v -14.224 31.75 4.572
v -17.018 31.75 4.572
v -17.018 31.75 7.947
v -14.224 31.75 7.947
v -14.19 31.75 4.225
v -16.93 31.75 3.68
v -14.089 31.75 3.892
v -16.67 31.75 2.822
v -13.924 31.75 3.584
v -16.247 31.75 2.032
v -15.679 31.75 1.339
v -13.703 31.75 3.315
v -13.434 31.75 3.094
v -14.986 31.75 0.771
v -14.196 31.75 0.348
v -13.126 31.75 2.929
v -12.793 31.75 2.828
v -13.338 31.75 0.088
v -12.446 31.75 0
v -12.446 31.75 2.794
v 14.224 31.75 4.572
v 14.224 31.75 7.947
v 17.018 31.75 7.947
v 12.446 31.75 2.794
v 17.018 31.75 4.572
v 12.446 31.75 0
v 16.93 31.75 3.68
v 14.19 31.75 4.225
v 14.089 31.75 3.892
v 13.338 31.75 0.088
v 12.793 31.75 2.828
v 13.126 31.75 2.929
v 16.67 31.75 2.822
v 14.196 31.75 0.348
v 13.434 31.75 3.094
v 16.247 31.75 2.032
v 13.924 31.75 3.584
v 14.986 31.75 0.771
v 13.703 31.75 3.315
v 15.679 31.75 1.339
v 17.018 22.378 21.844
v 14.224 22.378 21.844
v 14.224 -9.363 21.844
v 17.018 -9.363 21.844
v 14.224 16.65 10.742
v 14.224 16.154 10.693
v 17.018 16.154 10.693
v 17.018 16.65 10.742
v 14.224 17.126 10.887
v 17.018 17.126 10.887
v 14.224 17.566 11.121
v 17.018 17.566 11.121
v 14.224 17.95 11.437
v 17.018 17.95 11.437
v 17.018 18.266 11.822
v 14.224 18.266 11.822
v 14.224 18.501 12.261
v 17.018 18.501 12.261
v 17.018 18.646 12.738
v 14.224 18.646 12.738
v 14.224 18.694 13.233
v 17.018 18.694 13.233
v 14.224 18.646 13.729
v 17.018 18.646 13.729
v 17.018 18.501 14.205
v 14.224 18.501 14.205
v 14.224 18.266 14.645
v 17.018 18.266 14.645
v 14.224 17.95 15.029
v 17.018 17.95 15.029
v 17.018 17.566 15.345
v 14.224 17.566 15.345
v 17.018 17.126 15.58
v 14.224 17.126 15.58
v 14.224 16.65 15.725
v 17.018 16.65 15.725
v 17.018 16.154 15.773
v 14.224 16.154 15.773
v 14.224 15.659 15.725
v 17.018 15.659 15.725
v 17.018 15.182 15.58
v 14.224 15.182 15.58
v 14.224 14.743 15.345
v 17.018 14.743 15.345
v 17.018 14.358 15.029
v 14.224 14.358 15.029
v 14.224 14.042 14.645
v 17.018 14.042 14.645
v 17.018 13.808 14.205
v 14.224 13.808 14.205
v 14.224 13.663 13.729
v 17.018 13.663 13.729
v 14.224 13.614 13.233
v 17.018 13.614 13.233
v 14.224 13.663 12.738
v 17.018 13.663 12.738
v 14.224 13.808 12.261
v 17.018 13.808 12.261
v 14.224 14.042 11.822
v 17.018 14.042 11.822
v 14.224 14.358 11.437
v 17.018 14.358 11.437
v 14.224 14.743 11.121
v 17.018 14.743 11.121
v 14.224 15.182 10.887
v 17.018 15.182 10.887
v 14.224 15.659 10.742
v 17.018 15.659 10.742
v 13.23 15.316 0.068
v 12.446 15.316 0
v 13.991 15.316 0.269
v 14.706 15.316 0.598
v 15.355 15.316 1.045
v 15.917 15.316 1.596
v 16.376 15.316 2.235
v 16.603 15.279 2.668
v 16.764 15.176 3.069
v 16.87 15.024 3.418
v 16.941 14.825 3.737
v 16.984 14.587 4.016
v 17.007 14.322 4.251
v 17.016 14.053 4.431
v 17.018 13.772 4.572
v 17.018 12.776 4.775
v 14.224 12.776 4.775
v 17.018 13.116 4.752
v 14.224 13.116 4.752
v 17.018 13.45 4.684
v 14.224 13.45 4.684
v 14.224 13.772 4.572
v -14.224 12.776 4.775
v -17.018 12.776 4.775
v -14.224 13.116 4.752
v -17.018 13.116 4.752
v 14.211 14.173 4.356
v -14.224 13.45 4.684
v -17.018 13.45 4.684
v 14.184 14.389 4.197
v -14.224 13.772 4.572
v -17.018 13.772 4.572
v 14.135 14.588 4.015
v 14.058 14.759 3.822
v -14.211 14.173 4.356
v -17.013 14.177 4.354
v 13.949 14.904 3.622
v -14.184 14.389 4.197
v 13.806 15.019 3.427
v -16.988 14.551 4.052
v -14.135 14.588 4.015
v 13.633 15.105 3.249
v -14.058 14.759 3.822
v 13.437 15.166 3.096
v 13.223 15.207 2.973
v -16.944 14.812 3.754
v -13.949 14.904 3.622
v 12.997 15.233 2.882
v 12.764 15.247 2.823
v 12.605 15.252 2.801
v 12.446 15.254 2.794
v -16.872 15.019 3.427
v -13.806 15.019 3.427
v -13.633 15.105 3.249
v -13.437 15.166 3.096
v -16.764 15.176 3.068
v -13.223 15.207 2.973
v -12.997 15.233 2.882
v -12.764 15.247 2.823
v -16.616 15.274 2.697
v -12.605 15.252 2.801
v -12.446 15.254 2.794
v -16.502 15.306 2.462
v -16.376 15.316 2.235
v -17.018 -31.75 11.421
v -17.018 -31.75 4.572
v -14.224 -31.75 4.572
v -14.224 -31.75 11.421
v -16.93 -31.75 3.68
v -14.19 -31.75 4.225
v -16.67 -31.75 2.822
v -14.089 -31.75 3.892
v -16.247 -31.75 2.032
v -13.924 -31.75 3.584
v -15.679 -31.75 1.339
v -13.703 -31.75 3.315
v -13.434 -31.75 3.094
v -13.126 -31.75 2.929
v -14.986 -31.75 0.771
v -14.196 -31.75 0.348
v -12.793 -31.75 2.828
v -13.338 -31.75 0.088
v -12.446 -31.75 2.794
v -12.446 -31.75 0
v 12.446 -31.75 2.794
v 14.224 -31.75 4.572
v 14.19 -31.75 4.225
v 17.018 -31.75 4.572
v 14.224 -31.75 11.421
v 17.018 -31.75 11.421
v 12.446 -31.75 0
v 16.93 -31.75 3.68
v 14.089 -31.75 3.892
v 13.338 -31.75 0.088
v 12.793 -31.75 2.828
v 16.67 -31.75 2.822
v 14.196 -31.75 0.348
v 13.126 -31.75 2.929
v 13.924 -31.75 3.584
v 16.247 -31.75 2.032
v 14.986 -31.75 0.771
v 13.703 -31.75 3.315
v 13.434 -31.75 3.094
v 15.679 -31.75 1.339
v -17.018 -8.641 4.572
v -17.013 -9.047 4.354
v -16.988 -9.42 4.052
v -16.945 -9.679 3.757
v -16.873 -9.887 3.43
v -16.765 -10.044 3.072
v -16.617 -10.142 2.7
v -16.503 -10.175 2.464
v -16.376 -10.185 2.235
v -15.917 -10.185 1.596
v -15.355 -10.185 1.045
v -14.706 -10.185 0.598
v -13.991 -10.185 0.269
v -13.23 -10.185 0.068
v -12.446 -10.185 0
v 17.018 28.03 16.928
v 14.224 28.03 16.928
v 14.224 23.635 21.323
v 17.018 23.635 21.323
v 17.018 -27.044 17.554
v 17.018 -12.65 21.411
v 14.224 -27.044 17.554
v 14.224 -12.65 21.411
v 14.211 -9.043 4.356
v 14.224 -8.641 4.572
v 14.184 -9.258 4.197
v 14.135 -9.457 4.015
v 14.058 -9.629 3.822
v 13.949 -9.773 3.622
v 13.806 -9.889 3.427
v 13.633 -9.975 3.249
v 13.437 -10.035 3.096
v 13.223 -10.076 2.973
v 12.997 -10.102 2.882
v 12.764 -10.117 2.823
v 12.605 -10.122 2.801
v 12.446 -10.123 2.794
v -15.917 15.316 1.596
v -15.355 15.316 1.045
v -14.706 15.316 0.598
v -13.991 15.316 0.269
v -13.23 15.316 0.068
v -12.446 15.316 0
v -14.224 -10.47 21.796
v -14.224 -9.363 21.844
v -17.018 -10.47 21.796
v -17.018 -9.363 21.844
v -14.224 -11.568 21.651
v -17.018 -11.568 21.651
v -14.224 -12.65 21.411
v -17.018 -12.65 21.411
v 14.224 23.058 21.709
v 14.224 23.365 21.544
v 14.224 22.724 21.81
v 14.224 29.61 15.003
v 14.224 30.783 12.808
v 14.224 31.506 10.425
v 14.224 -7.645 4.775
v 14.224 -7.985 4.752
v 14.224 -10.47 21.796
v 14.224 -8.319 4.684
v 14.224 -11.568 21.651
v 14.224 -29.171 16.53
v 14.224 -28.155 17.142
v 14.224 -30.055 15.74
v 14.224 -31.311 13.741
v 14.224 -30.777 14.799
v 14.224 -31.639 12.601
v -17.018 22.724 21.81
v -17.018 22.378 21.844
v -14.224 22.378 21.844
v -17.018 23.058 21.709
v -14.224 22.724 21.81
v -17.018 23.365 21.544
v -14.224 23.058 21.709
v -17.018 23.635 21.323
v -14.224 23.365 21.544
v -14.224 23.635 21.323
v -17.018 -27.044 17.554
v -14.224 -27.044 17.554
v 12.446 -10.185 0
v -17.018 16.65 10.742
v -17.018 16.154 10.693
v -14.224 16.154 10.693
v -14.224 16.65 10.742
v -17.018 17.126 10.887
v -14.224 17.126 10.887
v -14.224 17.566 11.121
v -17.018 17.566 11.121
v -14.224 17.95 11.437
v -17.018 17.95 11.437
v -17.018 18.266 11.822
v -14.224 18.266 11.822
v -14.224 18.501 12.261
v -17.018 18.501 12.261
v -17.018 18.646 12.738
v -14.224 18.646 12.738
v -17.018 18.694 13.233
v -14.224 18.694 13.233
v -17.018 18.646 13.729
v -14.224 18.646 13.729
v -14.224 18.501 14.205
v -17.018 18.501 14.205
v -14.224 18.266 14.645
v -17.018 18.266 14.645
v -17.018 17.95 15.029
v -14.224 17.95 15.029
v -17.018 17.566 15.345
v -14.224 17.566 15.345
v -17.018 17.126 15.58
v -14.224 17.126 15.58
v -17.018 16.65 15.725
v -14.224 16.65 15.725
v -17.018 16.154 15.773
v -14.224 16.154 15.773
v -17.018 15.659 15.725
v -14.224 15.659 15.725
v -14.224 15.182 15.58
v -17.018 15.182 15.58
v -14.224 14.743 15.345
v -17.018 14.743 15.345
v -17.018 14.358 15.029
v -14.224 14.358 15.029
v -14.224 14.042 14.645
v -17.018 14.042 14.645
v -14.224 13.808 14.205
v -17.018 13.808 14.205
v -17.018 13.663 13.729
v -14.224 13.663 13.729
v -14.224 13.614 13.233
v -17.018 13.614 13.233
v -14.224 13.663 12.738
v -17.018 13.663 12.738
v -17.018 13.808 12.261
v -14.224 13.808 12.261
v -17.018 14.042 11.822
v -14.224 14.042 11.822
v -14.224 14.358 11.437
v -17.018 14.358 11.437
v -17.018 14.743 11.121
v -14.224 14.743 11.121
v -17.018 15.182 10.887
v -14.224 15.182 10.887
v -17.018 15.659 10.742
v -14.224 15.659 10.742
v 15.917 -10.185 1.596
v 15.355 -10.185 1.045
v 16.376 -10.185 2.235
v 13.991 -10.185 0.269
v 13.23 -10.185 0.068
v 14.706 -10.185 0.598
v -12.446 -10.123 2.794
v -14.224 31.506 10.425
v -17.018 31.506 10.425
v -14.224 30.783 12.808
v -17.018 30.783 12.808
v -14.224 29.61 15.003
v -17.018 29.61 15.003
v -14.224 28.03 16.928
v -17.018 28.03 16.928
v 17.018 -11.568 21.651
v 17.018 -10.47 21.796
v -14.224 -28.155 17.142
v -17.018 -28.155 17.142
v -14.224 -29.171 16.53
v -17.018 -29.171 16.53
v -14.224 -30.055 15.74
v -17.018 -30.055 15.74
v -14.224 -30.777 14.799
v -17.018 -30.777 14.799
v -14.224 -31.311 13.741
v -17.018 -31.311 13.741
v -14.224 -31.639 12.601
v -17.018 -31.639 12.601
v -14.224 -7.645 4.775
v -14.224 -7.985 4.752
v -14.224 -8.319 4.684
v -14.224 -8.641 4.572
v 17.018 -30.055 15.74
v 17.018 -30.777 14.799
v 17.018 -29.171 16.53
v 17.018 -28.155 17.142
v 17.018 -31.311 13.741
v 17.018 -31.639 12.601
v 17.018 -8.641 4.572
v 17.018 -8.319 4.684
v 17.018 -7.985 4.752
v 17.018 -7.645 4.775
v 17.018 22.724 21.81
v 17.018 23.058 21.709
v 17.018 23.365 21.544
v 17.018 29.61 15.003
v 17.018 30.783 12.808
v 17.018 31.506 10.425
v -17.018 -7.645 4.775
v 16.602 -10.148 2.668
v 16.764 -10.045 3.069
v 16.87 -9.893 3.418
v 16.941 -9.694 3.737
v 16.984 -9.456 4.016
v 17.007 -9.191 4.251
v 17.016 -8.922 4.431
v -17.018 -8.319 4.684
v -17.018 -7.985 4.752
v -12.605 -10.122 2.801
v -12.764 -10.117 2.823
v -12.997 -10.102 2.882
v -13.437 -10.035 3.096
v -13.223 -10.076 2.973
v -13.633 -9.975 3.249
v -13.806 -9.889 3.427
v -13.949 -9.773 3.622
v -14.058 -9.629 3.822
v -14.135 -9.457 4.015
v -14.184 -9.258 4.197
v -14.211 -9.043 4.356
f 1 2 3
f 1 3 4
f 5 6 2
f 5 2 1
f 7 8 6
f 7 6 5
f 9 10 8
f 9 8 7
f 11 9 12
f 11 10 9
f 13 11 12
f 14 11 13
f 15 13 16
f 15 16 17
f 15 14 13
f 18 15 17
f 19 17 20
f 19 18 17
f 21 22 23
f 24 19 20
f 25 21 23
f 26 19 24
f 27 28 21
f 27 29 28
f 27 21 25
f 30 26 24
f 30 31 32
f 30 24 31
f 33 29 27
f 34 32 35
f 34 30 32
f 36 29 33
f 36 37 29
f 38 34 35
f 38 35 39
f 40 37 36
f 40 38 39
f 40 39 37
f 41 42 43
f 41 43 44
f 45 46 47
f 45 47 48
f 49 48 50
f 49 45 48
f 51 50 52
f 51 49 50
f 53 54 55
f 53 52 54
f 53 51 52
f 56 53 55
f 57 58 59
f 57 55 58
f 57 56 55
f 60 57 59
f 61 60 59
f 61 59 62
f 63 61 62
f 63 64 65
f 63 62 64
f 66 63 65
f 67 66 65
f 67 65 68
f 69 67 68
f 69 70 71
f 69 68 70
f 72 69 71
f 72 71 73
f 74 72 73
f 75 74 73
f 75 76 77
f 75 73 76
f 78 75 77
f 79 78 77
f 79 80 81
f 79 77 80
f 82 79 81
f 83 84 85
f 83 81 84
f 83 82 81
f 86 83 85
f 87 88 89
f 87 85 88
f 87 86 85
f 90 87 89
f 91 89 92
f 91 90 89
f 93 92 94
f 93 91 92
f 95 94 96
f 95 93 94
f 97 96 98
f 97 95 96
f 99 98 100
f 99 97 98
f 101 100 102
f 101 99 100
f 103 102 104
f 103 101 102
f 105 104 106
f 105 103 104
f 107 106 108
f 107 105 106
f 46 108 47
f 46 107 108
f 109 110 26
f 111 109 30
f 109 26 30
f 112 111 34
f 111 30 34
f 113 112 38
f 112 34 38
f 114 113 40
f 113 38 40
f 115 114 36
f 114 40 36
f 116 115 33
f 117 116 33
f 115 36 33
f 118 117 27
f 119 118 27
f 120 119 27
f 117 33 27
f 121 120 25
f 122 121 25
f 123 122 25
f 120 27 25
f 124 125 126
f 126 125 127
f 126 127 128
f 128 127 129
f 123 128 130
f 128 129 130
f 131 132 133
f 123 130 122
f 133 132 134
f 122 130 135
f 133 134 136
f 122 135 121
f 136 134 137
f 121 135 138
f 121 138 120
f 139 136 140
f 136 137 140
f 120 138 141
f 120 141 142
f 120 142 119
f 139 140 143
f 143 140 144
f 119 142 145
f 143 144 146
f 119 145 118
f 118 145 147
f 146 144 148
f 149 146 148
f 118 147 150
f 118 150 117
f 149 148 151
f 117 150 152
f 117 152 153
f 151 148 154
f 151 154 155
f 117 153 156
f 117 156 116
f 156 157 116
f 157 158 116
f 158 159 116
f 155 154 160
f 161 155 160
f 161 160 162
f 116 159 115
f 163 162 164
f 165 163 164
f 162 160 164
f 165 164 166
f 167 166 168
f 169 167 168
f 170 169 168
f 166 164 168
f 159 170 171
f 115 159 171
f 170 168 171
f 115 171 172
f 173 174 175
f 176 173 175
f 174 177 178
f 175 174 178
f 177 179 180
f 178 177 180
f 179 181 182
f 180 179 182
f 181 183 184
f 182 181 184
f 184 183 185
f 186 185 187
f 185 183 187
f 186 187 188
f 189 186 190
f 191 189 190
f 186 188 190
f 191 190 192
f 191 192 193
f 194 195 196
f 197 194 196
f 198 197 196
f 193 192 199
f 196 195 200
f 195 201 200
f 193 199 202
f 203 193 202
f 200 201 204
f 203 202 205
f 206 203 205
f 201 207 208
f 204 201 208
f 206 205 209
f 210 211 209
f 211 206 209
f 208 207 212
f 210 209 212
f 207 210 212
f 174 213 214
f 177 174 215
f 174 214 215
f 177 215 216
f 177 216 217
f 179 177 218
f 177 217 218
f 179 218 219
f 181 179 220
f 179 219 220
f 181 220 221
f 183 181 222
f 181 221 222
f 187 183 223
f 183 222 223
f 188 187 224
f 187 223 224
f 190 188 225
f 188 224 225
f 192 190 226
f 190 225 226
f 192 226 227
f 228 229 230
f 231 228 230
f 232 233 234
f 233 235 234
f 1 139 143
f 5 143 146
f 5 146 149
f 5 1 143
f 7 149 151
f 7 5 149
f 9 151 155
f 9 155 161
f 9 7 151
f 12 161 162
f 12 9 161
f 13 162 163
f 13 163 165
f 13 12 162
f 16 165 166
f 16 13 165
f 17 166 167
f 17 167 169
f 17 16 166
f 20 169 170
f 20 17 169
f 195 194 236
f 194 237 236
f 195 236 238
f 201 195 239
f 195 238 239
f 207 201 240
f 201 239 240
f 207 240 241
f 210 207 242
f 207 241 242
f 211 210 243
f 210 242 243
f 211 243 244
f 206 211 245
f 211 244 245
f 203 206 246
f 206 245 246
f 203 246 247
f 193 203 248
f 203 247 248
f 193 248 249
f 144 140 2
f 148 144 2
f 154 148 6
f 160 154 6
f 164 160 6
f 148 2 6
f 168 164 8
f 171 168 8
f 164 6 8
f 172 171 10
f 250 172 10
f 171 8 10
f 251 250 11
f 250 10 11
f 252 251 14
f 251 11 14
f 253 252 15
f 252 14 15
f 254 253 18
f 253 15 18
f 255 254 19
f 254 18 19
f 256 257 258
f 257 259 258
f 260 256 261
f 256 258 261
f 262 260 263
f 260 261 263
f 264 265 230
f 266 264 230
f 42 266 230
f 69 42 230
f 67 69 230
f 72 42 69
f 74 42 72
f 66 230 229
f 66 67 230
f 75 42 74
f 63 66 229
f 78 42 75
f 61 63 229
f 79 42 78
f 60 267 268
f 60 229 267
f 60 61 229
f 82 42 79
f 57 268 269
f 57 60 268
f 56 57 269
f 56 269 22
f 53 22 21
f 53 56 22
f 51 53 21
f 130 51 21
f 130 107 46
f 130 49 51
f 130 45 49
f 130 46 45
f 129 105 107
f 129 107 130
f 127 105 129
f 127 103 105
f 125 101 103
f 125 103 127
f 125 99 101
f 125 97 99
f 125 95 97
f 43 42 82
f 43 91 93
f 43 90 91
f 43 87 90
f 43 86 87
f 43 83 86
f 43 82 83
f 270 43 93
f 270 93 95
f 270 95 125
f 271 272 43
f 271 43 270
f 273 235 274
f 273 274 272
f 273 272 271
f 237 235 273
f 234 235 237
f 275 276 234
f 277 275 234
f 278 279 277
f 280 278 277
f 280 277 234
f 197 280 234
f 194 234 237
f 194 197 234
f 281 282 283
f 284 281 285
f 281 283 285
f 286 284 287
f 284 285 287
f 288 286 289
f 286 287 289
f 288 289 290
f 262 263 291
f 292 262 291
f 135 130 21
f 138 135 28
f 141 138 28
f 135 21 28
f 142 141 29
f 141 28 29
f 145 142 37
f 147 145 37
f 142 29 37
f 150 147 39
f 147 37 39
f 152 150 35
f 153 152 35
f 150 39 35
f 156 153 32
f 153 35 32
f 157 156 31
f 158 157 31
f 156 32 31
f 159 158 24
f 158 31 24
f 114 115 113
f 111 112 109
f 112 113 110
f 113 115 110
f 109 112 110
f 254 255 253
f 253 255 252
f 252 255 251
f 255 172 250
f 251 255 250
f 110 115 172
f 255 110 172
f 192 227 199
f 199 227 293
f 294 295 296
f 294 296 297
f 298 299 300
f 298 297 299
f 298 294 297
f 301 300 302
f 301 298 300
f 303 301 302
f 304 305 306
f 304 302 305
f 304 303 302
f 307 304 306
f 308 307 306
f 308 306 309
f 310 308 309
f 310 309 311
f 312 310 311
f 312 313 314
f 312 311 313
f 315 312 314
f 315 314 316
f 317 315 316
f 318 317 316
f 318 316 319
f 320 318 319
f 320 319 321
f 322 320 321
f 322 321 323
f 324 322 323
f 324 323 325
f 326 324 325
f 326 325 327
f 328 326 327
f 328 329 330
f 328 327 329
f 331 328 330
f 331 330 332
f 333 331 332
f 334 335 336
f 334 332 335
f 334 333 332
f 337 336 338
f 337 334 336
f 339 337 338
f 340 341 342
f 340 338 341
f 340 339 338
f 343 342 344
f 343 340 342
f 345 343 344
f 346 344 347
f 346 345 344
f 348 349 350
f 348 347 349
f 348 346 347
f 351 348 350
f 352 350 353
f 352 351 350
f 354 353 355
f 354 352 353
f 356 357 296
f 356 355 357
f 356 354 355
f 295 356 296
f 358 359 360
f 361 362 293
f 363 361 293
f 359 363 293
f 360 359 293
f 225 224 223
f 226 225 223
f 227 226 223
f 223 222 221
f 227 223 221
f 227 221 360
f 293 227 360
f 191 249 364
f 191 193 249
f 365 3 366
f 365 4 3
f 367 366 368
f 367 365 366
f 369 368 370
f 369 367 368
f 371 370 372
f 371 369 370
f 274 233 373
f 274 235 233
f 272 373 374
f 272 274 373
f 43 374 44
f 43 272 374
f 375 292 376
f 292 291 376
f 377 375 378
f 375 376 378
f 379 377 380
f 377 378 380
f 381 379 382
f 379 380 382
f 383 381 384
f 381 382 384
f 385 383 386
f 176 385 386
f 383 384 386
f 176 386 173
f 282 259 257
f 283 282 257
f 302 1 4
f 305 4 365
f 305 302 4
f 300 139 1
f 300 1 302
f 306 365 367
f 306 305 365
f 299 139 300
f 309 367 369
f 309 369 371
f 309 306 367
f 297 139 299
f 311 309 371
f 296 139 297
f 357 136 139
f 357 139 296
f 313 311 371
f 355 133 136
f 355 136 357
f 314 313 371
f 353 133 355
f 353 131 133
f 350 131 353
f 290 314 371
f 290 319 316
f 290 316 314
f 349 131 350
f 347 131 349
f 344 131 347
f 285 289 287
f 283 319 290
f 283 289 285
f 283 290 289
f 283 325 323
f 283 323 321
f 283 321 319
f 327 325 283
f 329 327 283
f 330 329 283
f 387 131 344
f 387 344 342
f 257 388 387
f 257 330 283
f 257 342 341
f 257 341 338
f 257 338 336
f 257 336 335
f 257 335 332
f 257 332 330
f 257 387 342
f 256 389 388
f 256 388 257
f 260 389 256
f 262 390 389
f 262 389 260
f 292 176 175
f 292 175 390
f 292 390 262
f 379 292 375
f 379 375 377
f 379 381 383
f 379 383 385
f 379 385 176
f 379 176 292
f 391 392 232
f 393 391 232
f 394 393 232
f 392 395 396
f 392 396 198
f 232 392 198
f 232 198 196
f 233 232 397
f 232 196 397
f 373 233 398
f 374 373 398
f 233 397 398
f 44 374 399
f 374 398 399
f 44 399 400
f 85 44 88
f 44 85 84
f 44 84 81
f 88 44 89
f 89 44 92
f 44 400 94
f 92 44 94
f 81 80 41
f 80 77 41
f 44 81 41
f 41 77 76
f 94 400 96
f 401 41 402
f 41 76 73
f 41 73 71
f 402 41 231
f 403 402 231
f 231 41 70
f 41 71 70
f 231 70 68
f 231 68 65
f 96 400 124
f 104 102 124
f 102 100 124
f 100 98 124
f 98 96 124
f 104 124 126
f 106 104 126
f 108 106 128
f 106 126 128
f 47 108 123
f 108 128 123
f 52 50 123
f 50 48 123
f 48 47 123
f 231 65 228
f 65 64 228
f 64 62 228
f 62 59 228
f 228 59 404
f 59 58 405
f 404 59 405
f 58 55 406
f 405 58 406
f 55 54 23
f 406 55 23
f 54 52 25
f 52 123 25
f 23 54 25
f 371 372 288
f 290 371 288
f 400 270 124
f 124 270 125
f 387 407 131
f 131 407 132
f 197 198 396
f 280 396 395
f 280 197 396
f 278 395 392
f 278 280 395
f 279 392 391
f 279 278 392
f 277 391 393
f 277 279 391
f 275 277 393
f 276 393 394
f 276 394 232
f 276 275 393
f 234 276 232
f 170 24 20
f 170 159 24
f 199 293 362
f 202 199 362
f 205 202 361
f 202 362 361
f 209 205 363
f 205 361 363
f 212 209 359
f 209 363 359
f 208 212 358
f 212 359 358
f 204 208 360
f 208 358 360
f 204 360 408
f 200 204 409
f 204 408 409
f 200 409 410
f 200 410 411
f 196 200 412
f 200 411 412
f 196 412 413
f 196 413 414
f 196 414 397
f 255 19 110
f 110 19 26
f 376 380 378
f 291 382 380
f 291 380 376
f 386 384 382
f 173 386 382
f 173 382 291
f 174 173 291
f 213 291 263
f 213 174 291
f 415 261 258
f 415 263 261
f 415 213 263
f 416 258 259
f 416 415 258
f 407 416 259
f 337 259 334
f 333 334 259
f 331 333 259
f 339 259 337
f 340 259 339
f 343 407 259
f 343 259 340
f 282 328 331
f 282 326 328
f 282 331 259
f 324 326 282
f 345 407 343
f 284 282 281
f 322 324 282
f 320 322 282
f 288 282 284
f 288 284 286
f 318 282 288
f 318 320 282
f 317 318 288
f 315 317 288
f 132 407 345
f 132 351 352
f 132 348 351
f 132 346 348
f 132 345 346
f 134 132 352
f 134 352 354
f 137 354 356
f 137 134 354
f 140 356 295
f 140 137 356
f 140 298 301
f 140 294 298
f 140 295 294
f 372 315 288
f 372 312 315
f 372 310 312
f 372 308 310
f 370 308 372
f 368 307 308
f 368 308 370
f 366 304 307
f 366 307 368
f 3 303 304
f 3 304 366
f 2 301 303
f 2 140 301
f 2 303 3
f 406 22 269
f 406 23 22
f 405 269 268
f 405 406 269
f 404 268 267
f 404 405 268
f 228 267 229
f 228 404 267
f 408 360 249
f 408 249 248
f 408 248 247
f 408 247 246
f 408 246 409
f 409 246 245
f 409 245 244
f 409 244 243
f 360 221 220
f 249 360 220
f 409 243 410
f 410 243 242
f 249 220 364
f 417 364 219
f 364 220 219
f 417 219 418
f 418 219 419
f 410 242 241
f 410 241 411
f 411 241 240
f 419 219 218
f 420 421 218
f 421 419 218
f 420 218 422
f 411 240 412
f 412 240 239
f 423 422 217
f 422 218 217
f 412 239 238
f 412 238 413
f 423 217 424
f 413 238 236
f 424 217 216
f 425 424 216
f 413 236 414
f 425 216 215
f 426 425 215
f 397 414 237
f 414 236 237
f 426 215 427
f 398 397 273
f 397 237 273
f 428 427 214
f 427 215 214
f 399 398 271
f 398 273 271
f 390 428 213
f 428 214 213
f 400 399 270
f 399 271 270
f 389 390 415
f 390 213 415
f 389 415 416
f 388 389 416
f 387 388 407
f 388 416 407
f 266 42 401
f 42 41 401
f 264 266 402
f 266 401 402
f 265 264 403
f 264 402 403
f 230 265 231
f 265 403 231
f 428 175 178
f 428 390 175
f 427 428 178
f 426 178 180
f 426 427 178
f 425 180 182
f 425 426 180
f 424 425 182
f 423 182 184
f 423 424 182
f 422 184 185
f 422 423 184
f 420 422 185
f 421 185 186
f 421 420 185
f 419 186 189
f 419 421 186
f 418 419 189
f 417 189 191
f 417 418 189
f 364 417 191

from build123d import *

# Parameters (mm, degrees)
SKETCH1_W               = 34.036
SKETCH1_H               = 63.5
BOSS_EXTRUDE1_DEPTH     = 21.844
CUT_EXTRUDE1_DEPTH      = 43.12879253
CUT_EXTRUDE1_DEPTH_BACK = 43.12879253
CUT_EXTRUDE2_DEPTH      = 43.12879253
CUT_EXTRUDE2_DEPTH_BACK = 43.12879253
SKETCH3_R               = 2.54
FILLET1_R               = 12.7
FILLET2_R               = 6.35
FILLET3_R               = 1.778
FILLET4_R               = 4.572


with BuildPart() as part:
    # Sketch1 → Boss-Extrude1 (new body)
    with BuildSketch(Plane.XY):
        Rectangle(SKETCH1_W, SKETCH1_H)
    extrude(amount=BOSS_EXTRUDE1_DEPTH)

    # Sketch2 → Cut-Extrude1 (cut, two sides: drawn at the far end of the back side and taken through both)
    with BuildSketch(Plane(origin=(0, 0, 0), x_dir=(1, 0, 0), z_dir=(0, 1, 0)).offset(-CUT_EXTRUDE1_DEPTH_BACK)):
        Polygon((14.224, -108.086321581), (14.224, -21.844), (14.224, -2.794), (-14.224, -2.794), (-14.224, -21.844), (-14.224, -108.086321581), (-14.224, -280.570964742), (14.224, -280.570964742), align=None)
    extrude(amount=CUT_EXTRUDE1_DEPTH + CUT_EXTRUDE1_DEPTH_BACK, mode=Mode.SUBTRACT)

    # Sketch3 → Cut-Extrude2 (cut, two sides: drawn at the far end of the back side and taken through both)
    with BuildSketch(Plane(origin=(0, 0, 0), x_dir=(0, 0, -1), z_dir=(1, 0, 0)).offset(-CUT_EXTRUDE2_DEPTH_BACK)):
        with Locations((-13.2334, 16.1544)):
            Circle(SKETCH3_R)
        with BuildLine():
            Line((-2.2352, 15.3162), (2.957237461, 15.3162))
            Line((2.957237461, 15.3162), (2.957237461, -10.1854))
            Line((2.957237461, -10.1854), (-2.2352, -10.1854))
            ThreePointArc((-2.2352, -10.1854), (-4.031251224, -9.441451224), (-4.7752, -7.6454))
            Line((-4.7752, -7.6454), (-4.7752, 12.7762))
            ThreePointArc((-4.7752, 12.7762), (-4.031251224, 14.572251224), (-2.2352, 15.3162))
        make_face()
        Polygon((-13.208, 31.75), (-21.844, 23.114), (-30.192518149, 23.114), (-30.192518149, 40.531352169), (-13.208, 40.531352169), align=None)
        Polygon((-16.256, -31.889517823), (-16.256, -43.289335124), (-30.986485738, -43.289335124), (-30.986485738, 4.366875898), (-25.970871418, 4.366875898), align=None)
    extrude(amount=CUT_EXTRUDE2_DEPTH + CUT_EXTRUDE2_DEPTH_BACK, mode=Mode.SUBTRACT)

    # Fillet1
    fillet1_edges = [part.edges().sort_by_distance(p)[0] for p in [
        (15.621, 31.75, 13.208),
        (-15.621, 31.75, 13.208),
        (15.621, -11.034817911, 21.844),
        (-15.621, -11.034817911, 21.844),
    ]]
    fillet(fillet1_edges, radius=FILLET1_R)

    # Fillet2
    fillet2_edges = [part.edges().sort_by_distance(p)[0] for p in [
        (15.621, -31.75, 16.293383688),
        (-15.621, -31.75, 16.293383688),
    ]]
    fillet(fillet2_edges, radius=FILLET2_R)

    # Fillet3
    fillet3_edges = [part.edges().sort_by_distance(p)[0] for p in [
        (15.621, 23.114, 21.844),
        (14.224, -20.936584837, 2.794),
        (14.224, 23.501984837, 2.794),
        (-14.224, -20.936584837, 2.794),
        (-14.224, 23.501984837, 2.794),
        (-15.621, 23.114, 21.844),
    ]]
    fillet(fillet3_edges, radius=FILLET3_R)

    # Fillet4
    fillet4_edges = [part.edges().sort_by_distance(p)[0] for p in [
        (17.018, 23.5331, 0),
        (17.018, -20.9677, 0),
        (-17.018, 23.5331, 0),
        (-17.018, -20.9677, 0),
    ]]
    fillet(fillet4_edges, radius=FILLET4_R)


solid = part.part
